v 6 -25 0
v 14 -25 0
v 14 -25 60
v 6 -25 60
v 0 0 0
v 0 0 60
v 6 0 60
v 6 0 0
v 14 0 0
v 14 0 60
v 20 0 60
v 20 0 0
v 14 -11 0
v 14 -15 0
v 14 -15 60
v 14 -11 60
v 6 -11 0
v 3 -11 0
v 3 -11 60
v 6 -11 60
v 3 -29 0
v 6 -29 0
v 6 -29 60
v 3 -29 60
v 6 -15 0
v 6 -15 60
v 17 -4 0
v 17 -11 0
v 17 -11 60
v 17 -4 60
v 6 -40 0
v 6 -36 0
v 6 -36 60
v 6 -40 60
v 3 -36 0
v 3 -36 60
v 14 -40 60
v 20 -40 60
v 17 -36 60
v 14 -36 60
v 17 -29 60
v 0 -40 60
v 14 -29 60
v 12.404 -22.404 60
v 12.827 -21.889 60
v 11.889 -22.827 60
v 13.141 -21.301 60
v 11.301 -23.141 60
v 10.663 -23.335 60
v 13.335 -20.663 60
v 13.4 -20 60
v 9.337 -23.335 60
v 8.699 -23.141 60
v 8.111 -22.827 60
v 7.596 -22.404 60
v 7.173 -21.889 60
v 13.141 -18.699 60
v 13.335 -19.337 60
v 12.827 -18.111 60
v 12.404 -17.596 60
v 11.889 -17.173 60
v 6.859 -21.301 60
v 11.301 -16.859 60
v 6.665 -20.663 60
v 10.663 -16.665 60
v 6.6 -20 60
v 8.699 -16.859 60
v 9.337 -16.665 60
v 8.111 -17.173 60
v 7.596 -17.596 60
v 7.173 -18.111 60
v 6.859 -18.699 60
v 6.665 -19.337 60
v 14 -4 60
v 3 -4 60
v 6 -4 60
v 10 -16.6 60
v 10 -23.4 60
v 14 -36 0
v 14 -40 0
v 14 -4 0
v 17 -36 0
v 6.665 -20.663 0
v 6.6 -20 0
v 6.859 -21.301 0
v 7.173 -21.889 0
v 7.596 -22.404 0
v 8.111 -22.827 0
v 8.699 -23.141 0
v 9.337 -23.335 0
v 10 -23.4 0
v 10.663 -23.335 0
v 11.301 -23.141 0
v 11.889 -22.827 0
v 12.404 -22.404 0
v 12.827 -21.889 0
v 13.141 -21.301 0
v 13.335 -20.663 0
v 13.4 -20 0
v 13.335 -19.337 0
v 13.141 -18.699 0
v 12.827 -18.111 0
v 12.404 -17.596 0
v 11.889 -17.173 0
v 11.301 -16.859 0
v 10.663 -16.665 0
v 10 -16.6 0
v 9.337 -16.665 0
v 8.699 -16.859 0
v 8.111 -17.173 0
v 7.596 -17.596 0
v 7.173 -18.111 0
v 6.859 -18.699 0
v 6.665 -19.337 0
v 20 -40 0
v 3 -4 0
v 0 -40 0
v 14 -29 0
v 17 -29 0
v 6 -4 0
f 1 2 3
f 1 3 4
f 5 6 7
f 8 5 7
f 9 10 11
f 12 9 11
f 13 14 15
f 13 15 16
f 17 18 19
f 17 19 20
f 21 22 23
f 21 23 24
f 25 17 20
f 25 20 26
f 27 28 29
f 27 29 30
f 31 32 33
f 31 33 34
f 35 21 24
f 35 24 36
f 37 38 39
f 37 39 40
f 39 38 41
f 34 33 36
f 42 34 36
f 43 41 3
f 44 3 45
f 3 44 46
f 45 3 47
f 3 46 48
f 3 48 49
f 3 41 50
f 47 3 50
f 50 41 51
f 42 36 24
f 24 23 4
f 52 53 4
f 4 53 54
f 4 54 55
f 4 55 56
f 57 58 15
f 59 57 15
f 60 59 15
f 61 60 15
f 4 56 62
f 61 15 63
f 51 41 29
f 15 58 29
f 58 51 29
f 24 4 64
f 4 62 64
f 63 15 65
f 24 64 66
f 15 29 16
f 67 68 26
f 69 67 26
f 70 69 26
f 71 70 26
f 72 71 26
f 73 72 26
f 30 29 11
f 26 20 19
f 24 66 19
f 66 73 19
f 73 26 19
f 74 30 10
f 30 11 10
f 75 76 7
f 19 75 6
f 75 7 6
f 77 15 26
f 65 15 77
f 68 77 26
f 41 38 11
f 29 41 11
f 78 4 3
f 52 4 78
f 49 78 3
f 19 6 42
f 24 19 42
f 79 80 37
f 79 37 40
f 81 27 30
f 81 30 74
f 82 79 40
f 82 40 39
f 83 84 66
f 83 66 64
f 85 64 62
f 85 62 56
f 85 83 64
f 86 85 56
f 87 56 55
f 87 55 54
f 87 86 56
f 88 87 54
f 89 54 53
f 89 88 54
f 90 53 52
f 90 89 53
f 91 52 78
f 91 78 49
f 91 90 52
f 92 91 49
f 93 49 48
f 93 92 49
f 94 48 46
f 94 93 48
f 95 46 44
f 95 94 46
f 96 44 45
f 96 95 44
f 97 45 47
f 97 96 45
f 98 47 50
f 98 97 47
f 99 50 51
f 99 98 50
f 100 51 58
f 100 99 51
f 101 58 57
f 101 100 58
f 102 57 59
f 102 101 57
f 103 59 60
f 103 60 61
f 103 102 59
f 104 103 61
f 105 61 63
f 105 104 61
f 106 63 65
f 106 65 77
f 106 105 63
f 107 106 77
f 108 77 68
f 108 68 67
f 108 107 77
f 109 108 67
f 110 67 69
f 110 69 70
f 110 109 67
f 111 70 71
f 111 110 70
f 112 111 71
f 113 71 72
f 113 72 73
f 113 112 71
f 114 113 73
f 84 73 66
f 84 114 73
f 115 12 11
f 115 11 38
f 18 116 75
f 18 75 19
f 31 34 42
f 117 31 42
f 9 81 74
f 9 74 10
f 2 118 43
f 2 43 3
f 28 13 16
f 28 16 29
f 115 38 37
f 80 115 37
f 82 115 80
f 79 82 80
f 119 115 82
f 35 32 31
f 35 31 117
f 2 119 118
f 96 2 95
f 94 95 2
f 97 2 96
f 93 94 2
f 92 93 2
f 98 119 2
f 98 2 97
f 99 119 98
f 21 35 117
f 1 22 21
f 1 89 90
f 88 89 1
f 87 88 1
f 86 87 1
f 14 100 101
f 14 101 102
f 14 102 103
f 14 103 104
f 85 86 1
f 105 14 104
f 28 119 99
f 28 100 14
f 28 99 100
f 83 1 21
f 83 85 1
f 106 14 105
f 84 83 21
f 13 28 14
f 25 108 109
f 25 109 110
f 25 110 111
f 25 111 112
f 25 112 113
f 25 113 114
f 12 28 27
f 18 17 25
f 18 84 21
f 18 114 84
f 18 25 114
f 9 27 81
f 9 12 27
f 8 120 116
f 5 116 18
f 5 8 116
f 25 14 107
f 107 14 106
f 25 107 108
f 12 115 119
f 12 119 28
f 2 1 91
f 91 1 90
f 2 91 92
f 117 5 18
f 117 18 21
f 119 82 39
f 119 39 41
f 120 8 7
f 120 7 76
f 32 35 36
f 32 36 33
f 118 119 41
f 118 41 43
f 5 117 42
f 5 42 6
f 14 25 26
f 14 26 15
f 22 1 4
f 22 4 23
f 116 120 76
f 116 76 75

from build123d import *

# Parameters (mm, degrees)
SKETCH_2_R      = 3.4
EXTRUDE_1_DEPTH = 60


with BuildPart() as part:
    # 草图2 → 凸台-拉伸1 (new body)
    with BuildSketch(Plane.XY):
        Polygon((0, 0), (6, 0), (6, -4), (3, -4), (3, -11), (6, -11), (6, -15), (14, -15), (14, -11), (17, -11), (17, -4), (14, -4), (14, 0), (20, 0), (20, -40), (14, -40), (14, -36), (17, -36), (17, -29), (14, -29), (14, -25), (6, -25), (6, -29), (3, -29), (3, -36), (6, -36), (6, -40), (0, -40), align=None)
        with Locations(Location((10, -20, 0), (0, 0, 180))):
            Circle(SKETCH_2_R, mode=Mode.SUBTRACT)
    extrude(amount=EXTRUDE_1_DEPTH)


solid = part.part
